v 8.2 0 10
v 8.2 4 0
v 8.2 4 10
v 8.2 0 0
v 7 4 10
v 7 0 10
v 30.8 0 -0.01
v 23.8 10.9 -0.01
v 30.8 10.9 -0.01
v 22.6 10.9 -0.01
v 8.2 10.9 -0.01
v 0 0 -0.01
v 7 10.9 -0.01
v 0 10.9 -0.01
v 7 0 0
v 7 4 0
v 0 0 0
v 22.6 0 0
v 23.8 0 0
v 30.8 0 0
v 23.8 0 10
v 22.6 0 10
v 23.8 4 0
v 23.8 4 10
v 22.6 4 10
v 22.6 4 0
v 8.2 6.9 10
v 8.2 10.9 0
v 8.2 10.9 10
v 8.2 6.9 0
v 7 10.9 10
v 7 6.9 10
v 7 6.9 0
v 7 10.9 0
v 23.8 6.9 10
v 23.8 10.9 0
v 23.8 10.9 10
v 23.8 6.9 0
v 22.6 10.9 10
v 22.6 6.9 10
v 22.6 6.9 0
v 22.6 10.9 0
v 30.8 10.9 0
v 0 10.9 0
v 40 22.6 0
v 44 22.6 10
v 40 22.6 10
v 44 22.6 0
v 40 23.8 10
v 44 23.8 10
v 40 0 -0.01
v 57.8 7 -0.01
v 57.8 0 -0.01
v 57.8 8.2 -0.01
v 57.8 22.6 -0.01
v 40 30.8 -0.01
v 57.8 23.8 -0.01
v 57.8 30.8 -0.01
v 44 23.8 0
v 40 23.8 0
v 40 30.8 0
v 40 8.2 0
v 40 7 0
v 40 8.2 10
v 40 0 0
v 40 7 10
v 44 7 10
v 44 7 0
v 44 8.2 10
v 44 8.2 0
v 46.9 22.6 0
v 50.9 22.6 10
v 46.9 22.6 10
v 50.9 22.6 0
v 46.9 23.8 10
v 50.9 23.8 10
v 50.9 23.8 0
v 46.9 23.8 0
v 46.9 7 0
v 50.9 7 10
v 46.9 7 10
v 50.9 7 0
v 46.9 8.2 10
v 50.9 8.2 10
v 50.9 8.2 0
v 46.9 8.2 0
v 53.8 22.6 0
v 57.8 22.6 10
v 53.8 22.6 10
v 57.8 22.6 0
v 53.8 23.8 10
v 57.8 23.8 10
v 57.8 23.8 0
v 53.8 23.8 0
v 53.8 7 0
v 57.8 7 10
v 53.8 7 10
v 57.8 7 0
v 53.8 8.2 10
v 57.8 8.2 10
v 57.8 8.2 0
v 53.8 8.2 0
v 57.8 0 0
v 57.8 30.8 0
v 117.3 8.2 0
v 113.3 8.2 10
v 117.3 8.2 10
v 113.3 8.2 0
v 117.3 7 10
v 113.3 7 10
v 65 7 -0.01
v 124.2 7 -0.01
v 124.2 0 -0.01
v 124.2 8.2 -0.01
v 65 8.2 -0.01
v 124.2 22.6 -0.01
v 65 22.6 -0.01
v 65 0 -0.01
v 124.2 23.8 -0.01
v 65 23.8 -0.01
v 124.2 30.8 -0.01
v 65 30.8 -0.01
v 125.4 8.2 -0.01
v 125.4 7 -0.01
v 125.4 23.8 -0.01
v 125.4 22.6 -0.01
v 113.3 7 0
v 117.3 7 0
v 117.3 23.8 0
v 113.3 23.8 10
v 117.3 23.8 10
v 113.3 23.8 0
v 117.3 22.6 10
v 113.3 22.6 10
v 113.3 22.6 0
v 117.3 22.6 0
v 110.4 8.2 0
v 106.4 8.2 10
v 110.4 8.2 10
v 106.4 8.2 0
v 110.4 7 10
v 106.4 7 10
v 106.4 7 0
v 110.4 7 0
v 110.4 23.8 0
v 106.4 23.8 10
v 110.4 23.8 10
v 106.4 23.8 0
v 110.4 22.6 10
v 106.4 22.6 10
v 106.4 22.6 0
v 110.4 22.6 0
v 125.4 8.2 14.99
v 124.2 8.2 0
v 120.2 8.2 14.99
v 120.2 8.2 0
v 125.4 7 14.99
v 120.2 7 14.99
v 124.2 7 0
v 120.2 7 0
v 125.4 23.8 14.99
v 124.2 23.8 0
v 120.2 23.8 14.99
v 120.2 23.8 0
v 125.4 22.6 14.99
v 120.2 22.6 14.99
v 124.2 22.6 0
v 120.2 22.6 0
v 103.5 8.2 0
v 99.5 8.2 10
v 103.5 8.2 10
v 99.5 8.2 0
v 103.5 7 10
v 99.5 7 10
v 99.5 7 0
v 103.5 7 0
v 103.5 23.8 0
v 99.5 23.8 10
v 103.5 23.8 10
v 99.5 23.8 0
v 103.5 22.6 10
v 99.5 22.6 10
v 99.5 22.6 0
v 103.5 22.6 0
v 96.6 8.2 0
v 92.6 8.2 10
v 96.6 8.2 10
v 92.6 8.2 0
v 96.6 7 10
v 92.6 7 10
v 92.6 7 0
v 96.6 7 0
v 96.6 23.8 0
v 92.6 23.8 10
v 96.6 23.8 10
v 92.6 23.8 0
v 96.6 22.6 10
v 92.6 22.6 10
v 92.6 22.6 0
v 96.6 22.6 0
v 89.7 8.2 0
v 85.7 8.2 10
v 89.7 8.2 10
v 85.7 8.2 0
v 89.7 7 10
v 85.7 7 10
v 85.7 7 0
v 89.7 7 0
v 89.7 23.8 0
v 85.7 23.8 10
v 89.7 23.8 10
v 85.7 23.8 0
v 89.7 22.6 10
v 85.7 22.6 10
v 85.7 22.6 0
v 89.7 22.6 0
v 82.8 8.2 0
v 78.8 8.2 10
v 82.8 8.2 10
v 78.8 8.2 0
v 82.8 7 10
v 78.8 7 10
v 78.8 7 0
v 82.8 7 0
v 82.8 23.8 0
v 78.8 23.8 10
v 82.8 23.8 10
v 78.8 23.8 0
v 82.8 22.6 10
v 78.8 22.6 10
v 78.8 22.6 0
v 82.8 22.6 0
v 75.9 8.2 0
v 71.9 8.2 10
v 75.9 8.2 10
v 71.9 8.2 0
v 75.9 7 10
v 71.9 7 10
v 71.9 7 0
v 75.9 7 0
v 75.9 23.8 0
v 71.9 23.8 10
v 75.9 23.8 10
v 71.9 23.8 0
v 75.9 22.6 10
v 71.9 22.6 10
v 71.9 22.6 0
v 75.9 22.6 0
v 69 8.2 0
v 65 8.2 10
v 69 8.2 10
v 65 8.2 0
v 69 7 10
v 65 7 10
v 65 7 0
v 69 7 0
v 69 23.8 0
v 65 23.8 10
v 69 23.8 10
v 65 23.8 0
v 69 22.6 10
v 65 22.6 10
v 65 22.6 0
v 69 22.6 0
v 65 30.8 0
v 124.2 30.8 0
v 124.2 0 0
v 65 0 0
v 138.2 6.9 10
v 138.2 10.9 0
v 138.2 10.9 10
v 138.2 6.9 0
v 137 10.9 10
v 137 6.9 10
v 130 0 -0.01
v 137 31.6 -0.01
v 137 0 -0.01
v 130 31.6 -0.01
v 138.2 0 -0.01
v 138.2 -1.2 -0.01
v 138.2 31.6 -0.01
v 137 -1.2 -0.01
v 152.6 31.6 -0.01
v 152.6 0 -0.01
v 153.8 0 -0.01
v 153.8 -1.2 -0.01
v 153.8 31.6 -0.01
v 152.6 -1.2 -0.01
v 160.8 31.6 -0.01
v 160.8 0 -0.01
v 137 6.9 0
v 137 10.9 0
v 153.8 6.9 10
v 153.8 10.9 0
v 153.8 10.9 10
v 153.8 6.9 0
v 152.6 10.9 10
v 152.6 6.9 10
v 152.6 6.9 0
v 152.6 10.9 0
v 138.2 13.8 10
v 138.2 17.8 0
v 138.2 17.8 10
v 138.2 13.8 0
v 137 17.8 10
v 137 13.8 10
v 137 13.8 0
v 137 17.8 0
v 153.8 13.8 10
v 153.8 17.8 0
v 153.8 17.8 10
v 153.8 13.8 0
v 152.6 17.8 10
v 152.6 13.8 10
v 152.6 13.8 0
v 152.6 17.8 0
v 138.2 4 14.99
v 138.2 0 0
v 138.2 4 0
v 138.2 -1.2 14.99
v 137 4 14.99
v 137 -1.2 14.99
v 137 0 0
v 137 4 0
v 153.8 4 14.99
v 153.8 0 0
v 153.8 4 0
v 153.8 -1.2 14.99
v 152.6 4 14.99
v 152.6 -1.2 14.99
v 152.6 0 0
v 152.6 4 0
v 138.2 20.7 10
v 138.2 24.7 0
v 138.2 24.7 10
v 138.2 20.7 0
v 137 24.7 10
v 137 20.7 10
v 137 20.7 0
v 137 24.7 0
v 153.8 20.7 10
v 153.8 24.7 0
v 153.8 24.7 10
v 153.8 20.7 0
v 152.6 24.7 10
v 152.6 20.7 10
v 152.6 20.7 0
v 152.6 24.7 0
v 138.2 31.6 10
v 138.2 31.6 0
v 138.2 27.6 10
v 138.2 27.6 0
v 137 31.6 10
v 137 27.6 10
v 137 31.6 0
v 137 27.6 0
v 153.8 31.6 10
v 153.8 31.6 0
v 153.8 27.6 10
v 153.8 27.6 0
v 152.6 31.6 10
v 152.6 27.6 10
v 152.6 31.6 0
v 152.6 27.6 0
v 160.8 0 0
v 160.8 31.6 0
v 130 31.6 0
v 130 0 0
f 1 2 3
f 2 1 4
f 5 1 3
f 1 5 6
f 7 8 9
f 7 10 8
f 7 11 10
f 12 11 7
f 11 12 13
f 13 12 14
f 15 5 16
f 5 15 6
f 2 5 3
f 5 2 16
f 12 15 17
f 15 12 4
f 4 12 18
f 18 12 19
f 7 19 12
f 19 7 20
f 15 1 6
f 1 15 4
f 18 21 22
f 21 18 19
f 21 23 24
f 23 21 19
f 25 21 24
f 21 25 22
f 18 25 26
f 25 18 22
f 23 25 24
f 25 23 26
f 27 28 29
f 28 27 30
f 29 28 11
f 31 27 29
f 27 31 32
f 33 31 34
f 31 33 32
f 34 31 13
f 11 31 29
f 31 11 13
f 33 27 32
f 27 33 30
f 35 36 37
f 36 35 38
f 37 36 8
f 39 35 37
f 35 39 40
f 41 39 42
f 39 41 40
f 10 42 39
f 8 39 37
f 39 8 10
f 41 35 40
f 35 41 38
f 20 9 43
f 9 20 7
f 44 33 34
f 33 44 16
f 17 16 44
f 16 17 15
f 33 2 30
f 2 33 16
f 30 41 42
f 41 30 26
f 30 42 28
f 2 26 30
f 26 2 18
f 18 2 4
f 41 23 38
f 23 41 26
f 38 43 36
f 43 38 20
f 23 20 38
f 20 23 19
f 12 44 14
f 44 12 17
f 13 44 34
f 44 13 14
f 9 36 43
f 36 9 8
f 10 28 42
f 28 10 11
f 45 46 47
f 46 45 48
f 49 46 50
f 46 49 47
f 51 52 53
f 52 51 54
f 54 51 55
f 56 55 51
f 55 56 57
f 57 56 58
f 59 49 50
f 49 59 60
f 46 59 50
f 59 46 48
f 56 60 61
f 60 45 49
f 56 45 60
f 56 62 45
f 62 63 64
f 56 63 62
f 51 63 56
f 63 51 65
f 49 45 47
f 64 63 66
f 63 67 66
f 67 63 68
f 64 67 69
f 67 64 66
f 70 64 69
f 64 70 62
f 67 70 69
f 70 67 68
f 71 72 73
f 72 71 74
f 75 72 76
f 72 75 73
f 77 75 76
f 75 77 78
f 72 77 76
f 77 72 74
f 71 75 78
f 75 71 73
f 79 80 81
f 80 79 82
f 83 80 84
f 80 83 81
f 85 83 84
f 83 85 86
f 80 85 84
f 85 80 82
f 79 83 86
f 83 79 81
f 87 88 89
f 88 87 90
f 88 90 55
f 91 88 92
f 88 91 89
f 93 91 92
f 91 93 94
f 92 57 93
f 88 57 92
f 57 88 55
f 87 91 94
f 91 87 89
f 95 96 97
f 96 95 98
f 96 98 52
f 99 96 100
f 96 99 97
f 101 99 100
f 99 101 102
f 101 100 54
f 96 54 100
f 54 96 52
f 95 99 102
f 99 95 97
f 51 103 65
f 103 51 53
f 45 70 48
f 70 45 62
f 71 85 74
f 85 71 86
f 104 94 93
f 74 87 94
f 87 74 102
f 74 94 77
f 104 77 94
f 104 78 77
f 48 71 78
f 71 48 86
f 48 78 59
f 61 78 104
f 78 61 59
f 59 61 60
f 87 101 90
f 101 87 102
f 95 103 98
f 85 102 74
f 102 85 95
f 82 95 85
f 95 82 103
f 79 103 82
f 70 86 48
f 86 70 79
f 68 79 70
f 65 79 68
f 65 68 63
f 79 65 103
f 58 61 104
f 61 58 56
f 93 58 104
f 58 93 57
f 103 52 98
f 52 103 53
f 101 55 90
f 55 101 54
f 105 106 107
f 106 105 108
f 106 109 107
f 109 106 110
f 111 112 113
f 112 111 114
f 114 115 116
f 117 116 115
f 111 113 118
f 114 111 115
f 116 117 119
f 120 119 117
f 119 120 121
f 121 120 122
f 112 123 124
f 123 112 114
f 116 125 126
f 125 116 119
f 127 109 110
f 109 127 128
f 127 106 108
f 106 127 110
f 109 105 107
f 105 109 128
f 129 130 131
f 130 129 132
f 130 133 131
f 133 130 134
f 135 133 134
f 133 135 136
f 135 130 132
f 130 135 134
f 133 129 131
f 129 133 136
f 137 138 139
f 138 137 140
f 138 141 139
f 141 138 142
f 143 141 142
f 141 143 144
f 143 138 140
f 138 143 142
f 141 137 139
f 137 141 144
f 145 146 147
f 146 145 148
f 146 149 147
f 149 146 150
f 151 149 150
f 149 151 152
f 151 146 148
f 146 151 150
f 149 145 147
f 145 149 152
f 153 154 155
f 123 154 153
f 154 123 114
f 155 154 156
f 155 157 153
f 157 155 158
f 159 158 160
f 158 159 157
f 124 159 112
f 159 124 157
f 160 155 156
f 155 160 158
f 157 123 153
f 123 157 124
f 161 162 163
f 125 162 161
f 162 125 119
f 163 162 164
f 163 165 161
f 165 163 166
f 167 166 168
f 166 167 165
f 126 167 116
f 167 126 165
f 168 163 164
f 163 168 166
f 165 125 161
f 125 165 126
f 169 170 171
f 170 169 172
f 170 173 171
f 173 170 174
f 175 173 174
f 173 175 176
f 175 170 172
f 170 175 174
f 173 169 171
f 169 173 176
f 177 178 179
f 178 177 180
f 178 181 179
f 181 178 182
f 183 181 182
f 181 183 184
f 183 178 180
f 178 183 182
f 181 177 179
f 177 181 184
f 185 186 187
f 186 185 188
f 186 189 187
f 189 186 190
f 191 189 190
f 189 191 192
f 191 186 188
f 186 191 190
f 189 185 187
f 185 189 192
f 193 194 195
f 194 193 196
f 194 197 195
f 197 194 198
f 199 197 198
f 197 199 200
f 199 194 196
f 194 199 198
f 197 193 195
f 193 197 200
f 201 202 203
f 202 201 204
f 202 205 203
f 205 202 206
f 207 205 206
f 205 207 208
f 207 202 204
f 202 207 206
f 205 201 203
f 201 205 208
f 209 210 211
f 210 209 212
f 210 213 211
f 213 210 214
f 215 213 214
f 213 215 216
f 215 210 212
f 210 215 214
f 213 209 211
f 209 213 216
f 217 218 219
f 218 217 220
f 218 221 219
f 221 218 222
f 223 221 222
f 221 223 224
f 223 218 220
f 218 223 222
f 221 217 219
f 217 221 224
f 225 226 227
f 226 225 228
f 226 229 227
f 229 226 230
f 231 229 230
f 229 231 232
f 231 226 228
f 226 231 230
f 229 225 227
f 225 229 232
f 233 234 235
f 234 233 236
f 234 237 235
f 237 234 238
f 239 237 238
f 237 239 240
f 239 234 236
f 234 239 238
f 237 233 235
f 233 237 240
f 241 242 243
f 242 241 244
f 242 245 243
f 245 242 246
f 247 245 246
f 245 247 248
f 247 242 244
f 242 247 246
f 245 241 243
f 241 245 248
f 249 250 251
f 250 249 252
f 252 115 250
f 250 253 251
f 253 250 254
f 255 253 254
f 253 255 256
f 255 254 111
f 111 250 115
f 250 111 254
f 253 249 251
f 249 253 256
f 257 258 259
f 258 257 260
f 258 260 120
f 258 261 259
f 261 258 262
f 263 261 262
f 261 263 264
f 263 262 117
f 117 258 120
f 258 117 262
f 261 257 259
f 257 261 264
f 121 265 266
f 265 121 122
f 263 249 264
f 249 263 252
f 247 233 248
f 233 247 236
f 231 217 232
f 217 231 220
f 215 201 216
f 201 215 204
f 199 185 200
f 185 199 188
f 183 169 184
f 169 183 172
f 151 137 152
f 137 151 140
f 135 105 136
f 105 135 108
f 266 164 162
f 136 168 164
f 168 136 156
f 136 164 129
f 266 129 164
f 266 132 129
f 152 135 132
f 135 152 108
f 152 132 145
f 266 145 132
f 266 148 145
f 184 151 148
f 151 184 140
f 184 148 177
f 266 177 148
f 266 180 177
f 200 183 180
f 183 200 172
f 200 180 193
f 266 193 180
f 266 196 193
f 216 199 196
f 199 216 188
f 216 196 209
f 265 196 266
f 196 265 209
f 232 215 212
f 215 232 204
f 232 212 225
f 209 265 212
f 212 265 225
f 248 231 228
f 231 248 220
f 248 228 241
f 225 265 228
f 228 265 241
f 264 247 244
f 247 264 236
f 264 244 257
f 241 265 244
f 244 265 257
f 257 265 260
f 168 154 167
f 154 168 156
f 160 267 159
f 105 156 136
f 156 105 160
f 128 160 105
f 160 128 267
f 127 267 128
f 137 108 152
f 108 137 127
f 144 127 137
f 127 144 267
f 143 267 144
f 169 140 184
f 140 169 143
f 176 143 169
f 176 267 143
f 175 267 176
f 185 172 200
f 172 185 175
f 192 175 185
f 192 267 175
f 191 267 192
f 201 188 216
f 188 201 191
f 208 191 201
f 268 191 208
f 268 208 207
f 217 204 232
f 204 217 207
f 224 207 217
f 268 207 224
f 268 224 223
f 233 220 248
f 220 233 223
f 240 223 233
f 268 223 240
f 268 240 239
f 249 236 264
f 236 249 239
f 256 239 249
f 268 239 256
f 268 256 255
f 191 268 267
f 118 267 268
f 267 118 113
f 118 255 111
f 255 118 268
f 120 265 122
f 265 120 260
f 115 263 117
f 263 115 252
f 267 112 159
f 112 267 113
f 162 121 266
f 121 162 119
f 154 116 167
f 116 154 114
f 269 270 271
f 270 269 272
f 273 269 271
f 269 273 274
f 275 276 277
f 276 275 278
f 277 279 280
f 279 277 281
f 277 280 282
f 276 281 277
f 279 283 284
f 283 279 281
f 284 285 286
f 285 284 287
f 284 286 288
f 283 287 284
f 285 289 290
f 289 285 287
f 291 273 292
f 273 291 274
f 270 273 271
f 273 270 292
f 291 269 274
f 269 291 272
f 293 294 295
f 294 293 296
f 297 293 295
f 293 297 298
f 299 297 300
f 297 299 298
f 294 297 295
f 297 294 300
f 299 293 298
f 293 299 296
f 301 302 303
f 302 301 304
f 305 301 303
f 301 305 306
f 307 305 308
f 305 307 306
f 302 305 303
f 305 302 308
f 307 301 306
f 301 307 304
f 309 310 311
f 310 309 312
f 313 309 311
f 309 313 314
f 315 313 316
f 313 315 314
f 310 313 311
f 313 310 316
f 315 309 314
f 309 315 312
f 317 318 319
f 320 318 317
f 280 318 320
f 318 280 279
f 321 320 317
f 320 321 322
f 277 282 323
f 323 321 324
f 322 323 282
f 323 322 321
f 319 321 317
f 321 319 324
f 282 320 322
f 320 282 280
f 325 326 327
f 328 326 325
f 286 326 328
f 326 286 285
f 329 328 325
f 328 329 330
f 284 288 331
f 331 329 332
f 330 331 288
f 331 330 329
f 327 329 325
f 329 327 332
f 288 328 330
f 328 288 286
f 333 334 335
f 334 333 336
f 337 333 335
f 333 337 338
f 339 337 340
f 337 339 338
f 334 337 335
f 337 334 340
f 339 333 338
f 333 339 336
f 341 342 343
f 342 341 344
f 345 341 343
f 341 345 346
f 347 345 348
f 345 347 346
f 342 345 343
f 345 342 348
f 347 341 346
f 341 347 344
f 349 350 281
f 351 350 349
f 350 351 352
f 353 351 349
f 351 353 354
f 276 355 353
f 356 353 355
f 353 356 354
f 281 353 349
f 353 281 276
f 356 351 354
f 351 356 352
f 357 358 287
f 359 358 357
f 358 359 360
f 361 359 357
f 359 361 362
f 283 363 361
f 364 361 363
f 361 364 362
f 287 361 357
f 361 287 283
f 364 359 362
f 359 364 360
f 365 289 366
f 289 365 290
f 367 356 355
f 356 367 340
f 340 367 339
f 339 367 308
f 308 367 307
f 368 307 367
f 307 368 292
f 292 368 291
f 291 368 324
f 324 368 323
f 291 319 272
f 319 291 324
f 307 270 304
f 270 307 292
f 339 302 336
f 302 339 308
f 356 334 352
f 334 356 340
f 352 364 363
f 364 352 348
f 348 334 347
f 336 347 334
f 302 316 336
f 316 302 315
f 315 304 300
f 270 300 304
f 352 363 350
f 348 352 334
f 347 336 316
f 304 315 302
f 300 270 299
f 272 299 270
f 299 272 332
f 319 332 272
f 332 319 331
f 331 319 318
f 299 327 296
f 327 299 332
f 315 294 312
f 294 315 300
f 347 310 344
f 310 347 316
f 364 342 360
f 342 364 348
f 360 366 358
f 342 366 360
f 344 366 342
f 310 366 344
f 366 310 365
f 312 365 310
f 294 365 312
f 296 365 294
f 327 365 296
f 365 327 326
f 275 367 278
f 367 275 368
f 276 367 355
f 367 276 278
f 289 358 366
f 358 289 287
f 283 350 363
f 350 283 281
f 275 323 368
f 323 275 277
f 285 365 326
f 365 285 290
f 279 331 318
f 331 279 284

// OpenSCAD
// file: ../../Base/Boxes.scad
// Fischertechnik Box Foundation
// Pre-designed Boxes

use <Constants.scad>

include <PlacementOptions.scad>

box190Width = 190;
box190Depth = 130;
box130Width = 130;
box130Depth = 95;
boxUsageHeight = 33.9;
boxWallThickness = 2.4;
boxBaseThickness = 1.0;

// getBoxWallThickness()
// Gets the wall thickness of a Fischertechnik Box

function getBoxWallThickness() = boxWallThickness;

// Gets the usable height of a fischertechnik box
function getBoxUsageHeight() = boxUsageHeight;

// Gets the thickness of the Fischertechnik box base.
function getBoxBaseThickness() = boxBaseThickness;

// Gets the usable inner space of a Box 190 as an x/y-list
function getBox190Space() = [
    box190Width - 2*getBoxWallThickness(), 
    box190Depth - 2*getBoxWallThickness() ];

// Imports the Fischertechnik empty box 130x190 mm and places it at position 0,0
// 190x130 are the outer sizes, the inner space is slightly smaller. Use getBox190Space() to get the inner sizes.
// This module needs the STL file "Fischertechnik Box 130x190.stl" in the library path.
// The box is positioned that the usable inner space is at the 0,0,0 position. The

module Box190() {
    translate([-getBoxWallThickness(),-getBoxWallThickness(),-getBoxBaseThickness()])
        import("Fischertechnik Box 130x190.stl", convexity=3);
}

// Gets the usable inner space of a Box 130 as an x/y-list
function getBox130Space() = [
    box130Width - 2*getBoxWallThickness(), 
    box130Depth - 2*getBoxWallThickness() ];

// Imports the Fischertechnik empty box 95x130 mm and places it at position 0,0
// 190x130 are the outer sizes, the inner space is slightly smaller. Use getBox190Space() to get the inner sizes.
// This module needs the STL file "Fischertechnik Box 95x130.stl" in the library path.
// The box is positioned that the usable inner space is at the 0,0,0 position. The

module Box130() {
    translate([-getBoxWallThickness(),-getBoxWallThickness(),-getBoxBaseThickness()])
        import("Fischertechnik Box 95x130.stl", convexity=3);
}

// Creates a web at the specified box walls
// corner 0 = LowerLeft, 1 = UpperLeft, 2 = UpperRight, 3 = LowerRight
// side 0 = LeftOfCorner, 1 = RightOfCorner
// distance = Distance in mm from the corner
// box = inner width and depth of the box (default: Box 190)
// webWidth = length of the web (default is 3 mms)
// webThickness = thickness of the web (default is 1 mm)

module BoxWeb(corner, side, distance, box=getBox190Space(), webWidth=3, webThickness=1.0) {
    sink = getBoxWallThickness()/2;

    width = (corner % 2 == 0) ? 
            (side == LeftOfCorner ? webWidth : webThickness) :
            (side == LeftOfCorner ? webThickness : webWidth);

    depth = (corner % 2 == 0) ? 
            (side == RightOfCorner ? webWidth : webThickness) :
            (side == RightOfCorner ? webThickness : webWidth);
    
    xDiff = corner == LowerLeft ? 
                (side == LeftOfCorner ? -sink : distance) :
            (corner == UpperLeft ?                
                (side == LeftOfCorner ? distance : -sink) :
            (corner == UpperRight ?
                (side == LeftOfCorner ? box.x-webWidth+sink : box.x-distance-webThickness) :
                (side == LeftOfCorner ? box.x-distance-webThickness: box.x-webWidth+sink)));

    yDiff = corner == LowerLeft ? 
                (side == RightOfCorner ? -sink : distance) :
            (corner == UpperLeft ?
                (side == RightOfCorner ? box.y-distance : box.y-webWidth+sink) :
            (corner == UpperRight ?
                (side == RightOfCorner ? box.y-webWidth+sink : box.y-distance) :
                (side == RightOfCorner ? distance : -sink)));
    
    translate([xDiff, yDiff, -getExcess()])
        cube([width, depth, boxUsageHeight + 2*getExcess()]);
}
// file: ../../Base/Rotation.scad
// Fischertechnik Box Foundation
// Geometry Helpers Rotation

include <PlacementOptions.scad>

// getRotatedSpace(space, rotation=NoRotation)
// Rotates the space dependent on the specified rotation

function getRotatedSpace(space, rotation=NoRotation) = [
    (rotation == Rotate90 || rotation == Rotate270) ? space.y : space.x,
    (rotation == Rotate90 || rotation == Rotate270) ? space.x : space.y
];

// Rotates the given space around the fixed left lower corner
// space = the space the children needs as width/depth list [width,depth]
// rotation = 0 Rotate0 degrees, 1 Rotate90 degrees, 2 Rotate180 degrees, 3 Rotate270 degrees (equivalent to -90)

module RotateFix(space, rotation=Rotate0) {
    dy = (rotation == Rotate0 || rotation == Rotate270) ? 0 :
        (rotation == Rotate90) ? space.x :
        space.y;
    dx = (rotation < Rotate180) ? 0 :
        (rotation == Rotate180) ? space.x :
        space.y;
    
    translate([dx, dy, 0])
        rotate([0, 0, rotations[rotation]])
            children();
}
// file: ../../Base/Alignment.scad
// Fischertechnik Box Foundation
// Geometry Helpers Alignment

include <PlacementOptions.scad>

// getAlignedX(elementWidth, spaceWidth, align=AlignRight, offset=0)
// Gets the aligned X offset of an element with the given
// width in the given space.
// elementWidth = The width of the element to positon
// spaceWidth = The space where the element should be aligned
// align = 0 AlignLeft, 1 AlignCenter, 2 AlignRight
// offset = an optional offset from the aligned position. When
// aligned left or centered, then positive values are in X direction.
// When aligned right then positive values are in negative X direction.

function getAlignedX(elementWidth, spaceWidth, align=AlignRight, offset=0) =
    (align == AlignLeft) ?
        offset :
        ((align == AlignCenter) ?
        (spaceWidth - elementWidth)/2 + offset :
        spaceWidth - offset - elementWidth);

// getAlignedY(elementDepth, spaceDepth, align=AlignTop, offset=0)
// Gets the aligned Y offset of an element with the given
// depth in the given space.
// elementDepth = The depth of the element to positon
// spaceDepth = The space where the element should be aligned
// align = 0 AlignBottom, 1 AlignCenter, 2 AlignTop
// offset = an optional offset from the aligned position. When
// aligned bottom or centered, then positive values are in Y direction.
// When aligned top then positive values are in negative Y direction.

function getAlignedY(elementDepth, spaceDepth, align=AlignTop, offset=0) =
    (align == AlignBottom) ?
        offset :
        ((align == AlignCenter) ?
        (spaceDepth - elementDepth)/2 + offset :
        spaceDepth - offset - elementDepth);
// file: ../../Base/Constants.scad
// Fischertechnik Box Foundation
// Constants

// Constant values necessary for multiple elements

// Base constants
dividerThickness = 1.2;
excess = 0.01;
fragments = 90;
tolerance = 0.8;

// Gets the thickness of a divider 
function getDividerThickness() = dividerThickness;

// Gets the excess that is used to merge walls into each other
function getExcess() = excess;

// Gets amount of fragments of a cylinder
function getFragments() = fragments;

// Gets the inner tolerance of a frame to each side
function getTolerance() = tolerance;


// Fischertechnik specific constants
axisDiameter = 4;
axisBottomDiameter = axisDiameter + 1;
standardEdgeDistance = 2.5;
standardWebDistance = 11.5;
standardCornerLength = 15;
tubeWallFactor = 1.6;

// Gets axis diameter
function getAxisDiameter() = axisDiameter;

// Gets axis bottom diameter for thicker part at the bottom
function getAxisBottomDiameter() = axisBottomDiameter;

// gets the standard distance to the wall of the box for dockable frames with webs
function getStandardEdgeDistance() = standardEdgeDistance;

// gets the standard distance of each web to the corner of the dockable frame
function getStandardWebDistance() = standardWebDistance;

// gets the standard length of the corner walls of a dockable frame
function getStandardCornerLength() = standardCornerLength;

// gets the wall thickness of a tube.
function getTubeWallThickness() = tubeWallFactor * getDividerThickness();
// file: ../../Base/PlacementOptions.scad
// Fischertechnik Box Foundation
// Placement Options

// Alignment
NoAlign = 0;
AlignLeft = 1;
AlignBottom = 2;
AlignCenter = 3;
AlignRight = 4;
AlignTop = 5;

// Element rotation degree steps
rotations = [0, -90, -180, -270];

// Rotation
NoRotation = 0;
Rotate0 = 0;
Rotate90 = 1;
Rotate180 = 2;
Rotate270 = 3;

// Docking (seen from above)
NoDock = -1;
DockLeft = 0;
DockTop = 1;
DockRight = 2;
DockCorner = 2;
DockBottom = 3;

// Web corners
LowerLeft = 0;
UpperLeft = 1;
UpperRight = 2;
LowerRight = 3;

// Web position relative to corner
LeftOfCorner = 0;
RightOfCorner = 1;
// file: ../../Elements/HolderBuildingPlate30x30.scad
// Fischertechnik Box Library
// Holder for Building Plate 30x30
// 38259

use <../ModelBase/Complex.scad>

width = 30;

// getHolderBuildingPlate30x30Space(count = 1)
// Gets the width (.x) and depth (.y) space the holder needs.

function getHolderBuildingPlate30x30Space(count = 1) = getHolderBuildingPlateSpace(width, count);

// HolderBuildingPlate30x30(count=1, dock=false)
// Holder for building plates 30x30
// count = Count of building plates (default 1)
// dock = true if the holders are docked to the box wall (default false) 

module HolderBuildingPlate30x30(count = 1, dock = false) {
    HolderBuildingPlate(width, count, firstGapHigher = dock);
}

// Test
color("lightgray")
HolderBuildingPlate30x30(2);
// file: ../../Base/Placement.scad
// Fischertechnik Box Foundation
// Geometry Helpers Placement

use <Constants.scad>
use <Alignment.scad>
use <Rotation.scad>
use <Boxes.scad>

include <PlacementOptions.scad>

// Place(x=0, y=0, elementSpace=[0,0], alignX=AlignLeft, alignY=AlignBottom, rotation=Rotate0, boxSpace=getBox190Space())
// Places the child at the specified position
// y = Y-Position. This is a relative position when an X aligment is specified.
// x = X-Position. This is a relative position when an Y aligment is specified.
// elementSpace = space of the element to be placed [x,y]
// alignX = -1=NoAlign, 0 AlignLeft, 1 AlignCenter, 3 AlignRight (elementSpace and boxSpace required!)
// alignY = -1=NoAlign, 2 AlignBottom, 1 AlignCenter, 4 AlignTop (elementSpace and boxSpace required!)
// rotation = 0 Rotate0 0 degrees, 1 Rotate90 90 degrees, 
// 2 Rotate180 180 degrees, 3 Rotate270 270 degrees (equivalent to -90)
// boxSpace = Inner space of the box where the placement occurs [x,y] - default is Box 190x130 inner space

module Place(x=0, y=0, elementSpace=[0,0], 
  alignX=AlignLeft, alignY=AlignBottom, 
  rotation=NoRotation, boxSpace=getBox190Space()) {

    module Position(x, y, space, rotation=Rotate0) {
        translate([x, y, 0])
            RotateFix(space, rotation)
                children(0);
    }

    space = getRotatedSpace(elementSpace, rotation);
    alignedX = getAlignedX(space.x, boxSpace.x, alignX, x);
    alignedY = getAlignedY(space.y, boxSpace.y, alignY, y);
    Position(alignedX, alignedY, elementSpace, rotation)
        children(0);
}

// Center(space=getBox130Space(), elementSpace=[0,0])
// space = Space where the children is centered. For cylinder use centered=true and no elementSpace.
// elementSpace = space of the element to be centered [x,y]

module Center(space=getBox190Space(), elementSpace=[0,0]) {
    translate([(space.x - elementSpace.x) / 2, (space.y - elementSpace.y) / 2])
        children(0);
}

// CenterHorizontal(width=0, y=0, offset=0, space=getBox130Space())
// space = Space where the children is centered. For cylinder use centered=true and no elementSpace.
// elementSpace = space of the element to be centered [x,y]

module CenterHorizontal(width=0, y=0, offset=0, space=getBox190Space()) {
    translate([(space.x - width) / 2 + offset, y])
        children(0);
}

// CenterVertical(depth=0, x=0, offset=0, space=getBox130Space())
// space = Space where the children is centered. For cylinder use centered=true and no elementSpace.
// elementSpace = space of the element to be centered [x,y]

module CenterVerticalal(depth=0, x=0, offset=0, space=getBox190Space()) {
    translate([x, (space.y - depth) / 2 + offset])
        children(0);
}
// main file
// Fischertechnik Box Foundation
// Elements
// Test HolderBuildingPlate30x30

use <../../Base/Placement.scad>
use <../../Elements/HolderBuildingPlate30x30.scad>

include <../../Base/PlacementOptions.scad>

HolderBuildingPlate30x30();

Place(40, 0, elementSpace=getHolderBuildingPlate30x30Space(2), rotation=Rotate90)
    HolderBuildingPlate30x30(2);

Place(65, 0, elementSpace=getHolderBuildingPlate30x30Space(8), rotation=Rotate270)
    HolderBuildingPlate30x30(8, true);

Place(130, 0)
    HolderBuildingPlate30x30(4, true);
